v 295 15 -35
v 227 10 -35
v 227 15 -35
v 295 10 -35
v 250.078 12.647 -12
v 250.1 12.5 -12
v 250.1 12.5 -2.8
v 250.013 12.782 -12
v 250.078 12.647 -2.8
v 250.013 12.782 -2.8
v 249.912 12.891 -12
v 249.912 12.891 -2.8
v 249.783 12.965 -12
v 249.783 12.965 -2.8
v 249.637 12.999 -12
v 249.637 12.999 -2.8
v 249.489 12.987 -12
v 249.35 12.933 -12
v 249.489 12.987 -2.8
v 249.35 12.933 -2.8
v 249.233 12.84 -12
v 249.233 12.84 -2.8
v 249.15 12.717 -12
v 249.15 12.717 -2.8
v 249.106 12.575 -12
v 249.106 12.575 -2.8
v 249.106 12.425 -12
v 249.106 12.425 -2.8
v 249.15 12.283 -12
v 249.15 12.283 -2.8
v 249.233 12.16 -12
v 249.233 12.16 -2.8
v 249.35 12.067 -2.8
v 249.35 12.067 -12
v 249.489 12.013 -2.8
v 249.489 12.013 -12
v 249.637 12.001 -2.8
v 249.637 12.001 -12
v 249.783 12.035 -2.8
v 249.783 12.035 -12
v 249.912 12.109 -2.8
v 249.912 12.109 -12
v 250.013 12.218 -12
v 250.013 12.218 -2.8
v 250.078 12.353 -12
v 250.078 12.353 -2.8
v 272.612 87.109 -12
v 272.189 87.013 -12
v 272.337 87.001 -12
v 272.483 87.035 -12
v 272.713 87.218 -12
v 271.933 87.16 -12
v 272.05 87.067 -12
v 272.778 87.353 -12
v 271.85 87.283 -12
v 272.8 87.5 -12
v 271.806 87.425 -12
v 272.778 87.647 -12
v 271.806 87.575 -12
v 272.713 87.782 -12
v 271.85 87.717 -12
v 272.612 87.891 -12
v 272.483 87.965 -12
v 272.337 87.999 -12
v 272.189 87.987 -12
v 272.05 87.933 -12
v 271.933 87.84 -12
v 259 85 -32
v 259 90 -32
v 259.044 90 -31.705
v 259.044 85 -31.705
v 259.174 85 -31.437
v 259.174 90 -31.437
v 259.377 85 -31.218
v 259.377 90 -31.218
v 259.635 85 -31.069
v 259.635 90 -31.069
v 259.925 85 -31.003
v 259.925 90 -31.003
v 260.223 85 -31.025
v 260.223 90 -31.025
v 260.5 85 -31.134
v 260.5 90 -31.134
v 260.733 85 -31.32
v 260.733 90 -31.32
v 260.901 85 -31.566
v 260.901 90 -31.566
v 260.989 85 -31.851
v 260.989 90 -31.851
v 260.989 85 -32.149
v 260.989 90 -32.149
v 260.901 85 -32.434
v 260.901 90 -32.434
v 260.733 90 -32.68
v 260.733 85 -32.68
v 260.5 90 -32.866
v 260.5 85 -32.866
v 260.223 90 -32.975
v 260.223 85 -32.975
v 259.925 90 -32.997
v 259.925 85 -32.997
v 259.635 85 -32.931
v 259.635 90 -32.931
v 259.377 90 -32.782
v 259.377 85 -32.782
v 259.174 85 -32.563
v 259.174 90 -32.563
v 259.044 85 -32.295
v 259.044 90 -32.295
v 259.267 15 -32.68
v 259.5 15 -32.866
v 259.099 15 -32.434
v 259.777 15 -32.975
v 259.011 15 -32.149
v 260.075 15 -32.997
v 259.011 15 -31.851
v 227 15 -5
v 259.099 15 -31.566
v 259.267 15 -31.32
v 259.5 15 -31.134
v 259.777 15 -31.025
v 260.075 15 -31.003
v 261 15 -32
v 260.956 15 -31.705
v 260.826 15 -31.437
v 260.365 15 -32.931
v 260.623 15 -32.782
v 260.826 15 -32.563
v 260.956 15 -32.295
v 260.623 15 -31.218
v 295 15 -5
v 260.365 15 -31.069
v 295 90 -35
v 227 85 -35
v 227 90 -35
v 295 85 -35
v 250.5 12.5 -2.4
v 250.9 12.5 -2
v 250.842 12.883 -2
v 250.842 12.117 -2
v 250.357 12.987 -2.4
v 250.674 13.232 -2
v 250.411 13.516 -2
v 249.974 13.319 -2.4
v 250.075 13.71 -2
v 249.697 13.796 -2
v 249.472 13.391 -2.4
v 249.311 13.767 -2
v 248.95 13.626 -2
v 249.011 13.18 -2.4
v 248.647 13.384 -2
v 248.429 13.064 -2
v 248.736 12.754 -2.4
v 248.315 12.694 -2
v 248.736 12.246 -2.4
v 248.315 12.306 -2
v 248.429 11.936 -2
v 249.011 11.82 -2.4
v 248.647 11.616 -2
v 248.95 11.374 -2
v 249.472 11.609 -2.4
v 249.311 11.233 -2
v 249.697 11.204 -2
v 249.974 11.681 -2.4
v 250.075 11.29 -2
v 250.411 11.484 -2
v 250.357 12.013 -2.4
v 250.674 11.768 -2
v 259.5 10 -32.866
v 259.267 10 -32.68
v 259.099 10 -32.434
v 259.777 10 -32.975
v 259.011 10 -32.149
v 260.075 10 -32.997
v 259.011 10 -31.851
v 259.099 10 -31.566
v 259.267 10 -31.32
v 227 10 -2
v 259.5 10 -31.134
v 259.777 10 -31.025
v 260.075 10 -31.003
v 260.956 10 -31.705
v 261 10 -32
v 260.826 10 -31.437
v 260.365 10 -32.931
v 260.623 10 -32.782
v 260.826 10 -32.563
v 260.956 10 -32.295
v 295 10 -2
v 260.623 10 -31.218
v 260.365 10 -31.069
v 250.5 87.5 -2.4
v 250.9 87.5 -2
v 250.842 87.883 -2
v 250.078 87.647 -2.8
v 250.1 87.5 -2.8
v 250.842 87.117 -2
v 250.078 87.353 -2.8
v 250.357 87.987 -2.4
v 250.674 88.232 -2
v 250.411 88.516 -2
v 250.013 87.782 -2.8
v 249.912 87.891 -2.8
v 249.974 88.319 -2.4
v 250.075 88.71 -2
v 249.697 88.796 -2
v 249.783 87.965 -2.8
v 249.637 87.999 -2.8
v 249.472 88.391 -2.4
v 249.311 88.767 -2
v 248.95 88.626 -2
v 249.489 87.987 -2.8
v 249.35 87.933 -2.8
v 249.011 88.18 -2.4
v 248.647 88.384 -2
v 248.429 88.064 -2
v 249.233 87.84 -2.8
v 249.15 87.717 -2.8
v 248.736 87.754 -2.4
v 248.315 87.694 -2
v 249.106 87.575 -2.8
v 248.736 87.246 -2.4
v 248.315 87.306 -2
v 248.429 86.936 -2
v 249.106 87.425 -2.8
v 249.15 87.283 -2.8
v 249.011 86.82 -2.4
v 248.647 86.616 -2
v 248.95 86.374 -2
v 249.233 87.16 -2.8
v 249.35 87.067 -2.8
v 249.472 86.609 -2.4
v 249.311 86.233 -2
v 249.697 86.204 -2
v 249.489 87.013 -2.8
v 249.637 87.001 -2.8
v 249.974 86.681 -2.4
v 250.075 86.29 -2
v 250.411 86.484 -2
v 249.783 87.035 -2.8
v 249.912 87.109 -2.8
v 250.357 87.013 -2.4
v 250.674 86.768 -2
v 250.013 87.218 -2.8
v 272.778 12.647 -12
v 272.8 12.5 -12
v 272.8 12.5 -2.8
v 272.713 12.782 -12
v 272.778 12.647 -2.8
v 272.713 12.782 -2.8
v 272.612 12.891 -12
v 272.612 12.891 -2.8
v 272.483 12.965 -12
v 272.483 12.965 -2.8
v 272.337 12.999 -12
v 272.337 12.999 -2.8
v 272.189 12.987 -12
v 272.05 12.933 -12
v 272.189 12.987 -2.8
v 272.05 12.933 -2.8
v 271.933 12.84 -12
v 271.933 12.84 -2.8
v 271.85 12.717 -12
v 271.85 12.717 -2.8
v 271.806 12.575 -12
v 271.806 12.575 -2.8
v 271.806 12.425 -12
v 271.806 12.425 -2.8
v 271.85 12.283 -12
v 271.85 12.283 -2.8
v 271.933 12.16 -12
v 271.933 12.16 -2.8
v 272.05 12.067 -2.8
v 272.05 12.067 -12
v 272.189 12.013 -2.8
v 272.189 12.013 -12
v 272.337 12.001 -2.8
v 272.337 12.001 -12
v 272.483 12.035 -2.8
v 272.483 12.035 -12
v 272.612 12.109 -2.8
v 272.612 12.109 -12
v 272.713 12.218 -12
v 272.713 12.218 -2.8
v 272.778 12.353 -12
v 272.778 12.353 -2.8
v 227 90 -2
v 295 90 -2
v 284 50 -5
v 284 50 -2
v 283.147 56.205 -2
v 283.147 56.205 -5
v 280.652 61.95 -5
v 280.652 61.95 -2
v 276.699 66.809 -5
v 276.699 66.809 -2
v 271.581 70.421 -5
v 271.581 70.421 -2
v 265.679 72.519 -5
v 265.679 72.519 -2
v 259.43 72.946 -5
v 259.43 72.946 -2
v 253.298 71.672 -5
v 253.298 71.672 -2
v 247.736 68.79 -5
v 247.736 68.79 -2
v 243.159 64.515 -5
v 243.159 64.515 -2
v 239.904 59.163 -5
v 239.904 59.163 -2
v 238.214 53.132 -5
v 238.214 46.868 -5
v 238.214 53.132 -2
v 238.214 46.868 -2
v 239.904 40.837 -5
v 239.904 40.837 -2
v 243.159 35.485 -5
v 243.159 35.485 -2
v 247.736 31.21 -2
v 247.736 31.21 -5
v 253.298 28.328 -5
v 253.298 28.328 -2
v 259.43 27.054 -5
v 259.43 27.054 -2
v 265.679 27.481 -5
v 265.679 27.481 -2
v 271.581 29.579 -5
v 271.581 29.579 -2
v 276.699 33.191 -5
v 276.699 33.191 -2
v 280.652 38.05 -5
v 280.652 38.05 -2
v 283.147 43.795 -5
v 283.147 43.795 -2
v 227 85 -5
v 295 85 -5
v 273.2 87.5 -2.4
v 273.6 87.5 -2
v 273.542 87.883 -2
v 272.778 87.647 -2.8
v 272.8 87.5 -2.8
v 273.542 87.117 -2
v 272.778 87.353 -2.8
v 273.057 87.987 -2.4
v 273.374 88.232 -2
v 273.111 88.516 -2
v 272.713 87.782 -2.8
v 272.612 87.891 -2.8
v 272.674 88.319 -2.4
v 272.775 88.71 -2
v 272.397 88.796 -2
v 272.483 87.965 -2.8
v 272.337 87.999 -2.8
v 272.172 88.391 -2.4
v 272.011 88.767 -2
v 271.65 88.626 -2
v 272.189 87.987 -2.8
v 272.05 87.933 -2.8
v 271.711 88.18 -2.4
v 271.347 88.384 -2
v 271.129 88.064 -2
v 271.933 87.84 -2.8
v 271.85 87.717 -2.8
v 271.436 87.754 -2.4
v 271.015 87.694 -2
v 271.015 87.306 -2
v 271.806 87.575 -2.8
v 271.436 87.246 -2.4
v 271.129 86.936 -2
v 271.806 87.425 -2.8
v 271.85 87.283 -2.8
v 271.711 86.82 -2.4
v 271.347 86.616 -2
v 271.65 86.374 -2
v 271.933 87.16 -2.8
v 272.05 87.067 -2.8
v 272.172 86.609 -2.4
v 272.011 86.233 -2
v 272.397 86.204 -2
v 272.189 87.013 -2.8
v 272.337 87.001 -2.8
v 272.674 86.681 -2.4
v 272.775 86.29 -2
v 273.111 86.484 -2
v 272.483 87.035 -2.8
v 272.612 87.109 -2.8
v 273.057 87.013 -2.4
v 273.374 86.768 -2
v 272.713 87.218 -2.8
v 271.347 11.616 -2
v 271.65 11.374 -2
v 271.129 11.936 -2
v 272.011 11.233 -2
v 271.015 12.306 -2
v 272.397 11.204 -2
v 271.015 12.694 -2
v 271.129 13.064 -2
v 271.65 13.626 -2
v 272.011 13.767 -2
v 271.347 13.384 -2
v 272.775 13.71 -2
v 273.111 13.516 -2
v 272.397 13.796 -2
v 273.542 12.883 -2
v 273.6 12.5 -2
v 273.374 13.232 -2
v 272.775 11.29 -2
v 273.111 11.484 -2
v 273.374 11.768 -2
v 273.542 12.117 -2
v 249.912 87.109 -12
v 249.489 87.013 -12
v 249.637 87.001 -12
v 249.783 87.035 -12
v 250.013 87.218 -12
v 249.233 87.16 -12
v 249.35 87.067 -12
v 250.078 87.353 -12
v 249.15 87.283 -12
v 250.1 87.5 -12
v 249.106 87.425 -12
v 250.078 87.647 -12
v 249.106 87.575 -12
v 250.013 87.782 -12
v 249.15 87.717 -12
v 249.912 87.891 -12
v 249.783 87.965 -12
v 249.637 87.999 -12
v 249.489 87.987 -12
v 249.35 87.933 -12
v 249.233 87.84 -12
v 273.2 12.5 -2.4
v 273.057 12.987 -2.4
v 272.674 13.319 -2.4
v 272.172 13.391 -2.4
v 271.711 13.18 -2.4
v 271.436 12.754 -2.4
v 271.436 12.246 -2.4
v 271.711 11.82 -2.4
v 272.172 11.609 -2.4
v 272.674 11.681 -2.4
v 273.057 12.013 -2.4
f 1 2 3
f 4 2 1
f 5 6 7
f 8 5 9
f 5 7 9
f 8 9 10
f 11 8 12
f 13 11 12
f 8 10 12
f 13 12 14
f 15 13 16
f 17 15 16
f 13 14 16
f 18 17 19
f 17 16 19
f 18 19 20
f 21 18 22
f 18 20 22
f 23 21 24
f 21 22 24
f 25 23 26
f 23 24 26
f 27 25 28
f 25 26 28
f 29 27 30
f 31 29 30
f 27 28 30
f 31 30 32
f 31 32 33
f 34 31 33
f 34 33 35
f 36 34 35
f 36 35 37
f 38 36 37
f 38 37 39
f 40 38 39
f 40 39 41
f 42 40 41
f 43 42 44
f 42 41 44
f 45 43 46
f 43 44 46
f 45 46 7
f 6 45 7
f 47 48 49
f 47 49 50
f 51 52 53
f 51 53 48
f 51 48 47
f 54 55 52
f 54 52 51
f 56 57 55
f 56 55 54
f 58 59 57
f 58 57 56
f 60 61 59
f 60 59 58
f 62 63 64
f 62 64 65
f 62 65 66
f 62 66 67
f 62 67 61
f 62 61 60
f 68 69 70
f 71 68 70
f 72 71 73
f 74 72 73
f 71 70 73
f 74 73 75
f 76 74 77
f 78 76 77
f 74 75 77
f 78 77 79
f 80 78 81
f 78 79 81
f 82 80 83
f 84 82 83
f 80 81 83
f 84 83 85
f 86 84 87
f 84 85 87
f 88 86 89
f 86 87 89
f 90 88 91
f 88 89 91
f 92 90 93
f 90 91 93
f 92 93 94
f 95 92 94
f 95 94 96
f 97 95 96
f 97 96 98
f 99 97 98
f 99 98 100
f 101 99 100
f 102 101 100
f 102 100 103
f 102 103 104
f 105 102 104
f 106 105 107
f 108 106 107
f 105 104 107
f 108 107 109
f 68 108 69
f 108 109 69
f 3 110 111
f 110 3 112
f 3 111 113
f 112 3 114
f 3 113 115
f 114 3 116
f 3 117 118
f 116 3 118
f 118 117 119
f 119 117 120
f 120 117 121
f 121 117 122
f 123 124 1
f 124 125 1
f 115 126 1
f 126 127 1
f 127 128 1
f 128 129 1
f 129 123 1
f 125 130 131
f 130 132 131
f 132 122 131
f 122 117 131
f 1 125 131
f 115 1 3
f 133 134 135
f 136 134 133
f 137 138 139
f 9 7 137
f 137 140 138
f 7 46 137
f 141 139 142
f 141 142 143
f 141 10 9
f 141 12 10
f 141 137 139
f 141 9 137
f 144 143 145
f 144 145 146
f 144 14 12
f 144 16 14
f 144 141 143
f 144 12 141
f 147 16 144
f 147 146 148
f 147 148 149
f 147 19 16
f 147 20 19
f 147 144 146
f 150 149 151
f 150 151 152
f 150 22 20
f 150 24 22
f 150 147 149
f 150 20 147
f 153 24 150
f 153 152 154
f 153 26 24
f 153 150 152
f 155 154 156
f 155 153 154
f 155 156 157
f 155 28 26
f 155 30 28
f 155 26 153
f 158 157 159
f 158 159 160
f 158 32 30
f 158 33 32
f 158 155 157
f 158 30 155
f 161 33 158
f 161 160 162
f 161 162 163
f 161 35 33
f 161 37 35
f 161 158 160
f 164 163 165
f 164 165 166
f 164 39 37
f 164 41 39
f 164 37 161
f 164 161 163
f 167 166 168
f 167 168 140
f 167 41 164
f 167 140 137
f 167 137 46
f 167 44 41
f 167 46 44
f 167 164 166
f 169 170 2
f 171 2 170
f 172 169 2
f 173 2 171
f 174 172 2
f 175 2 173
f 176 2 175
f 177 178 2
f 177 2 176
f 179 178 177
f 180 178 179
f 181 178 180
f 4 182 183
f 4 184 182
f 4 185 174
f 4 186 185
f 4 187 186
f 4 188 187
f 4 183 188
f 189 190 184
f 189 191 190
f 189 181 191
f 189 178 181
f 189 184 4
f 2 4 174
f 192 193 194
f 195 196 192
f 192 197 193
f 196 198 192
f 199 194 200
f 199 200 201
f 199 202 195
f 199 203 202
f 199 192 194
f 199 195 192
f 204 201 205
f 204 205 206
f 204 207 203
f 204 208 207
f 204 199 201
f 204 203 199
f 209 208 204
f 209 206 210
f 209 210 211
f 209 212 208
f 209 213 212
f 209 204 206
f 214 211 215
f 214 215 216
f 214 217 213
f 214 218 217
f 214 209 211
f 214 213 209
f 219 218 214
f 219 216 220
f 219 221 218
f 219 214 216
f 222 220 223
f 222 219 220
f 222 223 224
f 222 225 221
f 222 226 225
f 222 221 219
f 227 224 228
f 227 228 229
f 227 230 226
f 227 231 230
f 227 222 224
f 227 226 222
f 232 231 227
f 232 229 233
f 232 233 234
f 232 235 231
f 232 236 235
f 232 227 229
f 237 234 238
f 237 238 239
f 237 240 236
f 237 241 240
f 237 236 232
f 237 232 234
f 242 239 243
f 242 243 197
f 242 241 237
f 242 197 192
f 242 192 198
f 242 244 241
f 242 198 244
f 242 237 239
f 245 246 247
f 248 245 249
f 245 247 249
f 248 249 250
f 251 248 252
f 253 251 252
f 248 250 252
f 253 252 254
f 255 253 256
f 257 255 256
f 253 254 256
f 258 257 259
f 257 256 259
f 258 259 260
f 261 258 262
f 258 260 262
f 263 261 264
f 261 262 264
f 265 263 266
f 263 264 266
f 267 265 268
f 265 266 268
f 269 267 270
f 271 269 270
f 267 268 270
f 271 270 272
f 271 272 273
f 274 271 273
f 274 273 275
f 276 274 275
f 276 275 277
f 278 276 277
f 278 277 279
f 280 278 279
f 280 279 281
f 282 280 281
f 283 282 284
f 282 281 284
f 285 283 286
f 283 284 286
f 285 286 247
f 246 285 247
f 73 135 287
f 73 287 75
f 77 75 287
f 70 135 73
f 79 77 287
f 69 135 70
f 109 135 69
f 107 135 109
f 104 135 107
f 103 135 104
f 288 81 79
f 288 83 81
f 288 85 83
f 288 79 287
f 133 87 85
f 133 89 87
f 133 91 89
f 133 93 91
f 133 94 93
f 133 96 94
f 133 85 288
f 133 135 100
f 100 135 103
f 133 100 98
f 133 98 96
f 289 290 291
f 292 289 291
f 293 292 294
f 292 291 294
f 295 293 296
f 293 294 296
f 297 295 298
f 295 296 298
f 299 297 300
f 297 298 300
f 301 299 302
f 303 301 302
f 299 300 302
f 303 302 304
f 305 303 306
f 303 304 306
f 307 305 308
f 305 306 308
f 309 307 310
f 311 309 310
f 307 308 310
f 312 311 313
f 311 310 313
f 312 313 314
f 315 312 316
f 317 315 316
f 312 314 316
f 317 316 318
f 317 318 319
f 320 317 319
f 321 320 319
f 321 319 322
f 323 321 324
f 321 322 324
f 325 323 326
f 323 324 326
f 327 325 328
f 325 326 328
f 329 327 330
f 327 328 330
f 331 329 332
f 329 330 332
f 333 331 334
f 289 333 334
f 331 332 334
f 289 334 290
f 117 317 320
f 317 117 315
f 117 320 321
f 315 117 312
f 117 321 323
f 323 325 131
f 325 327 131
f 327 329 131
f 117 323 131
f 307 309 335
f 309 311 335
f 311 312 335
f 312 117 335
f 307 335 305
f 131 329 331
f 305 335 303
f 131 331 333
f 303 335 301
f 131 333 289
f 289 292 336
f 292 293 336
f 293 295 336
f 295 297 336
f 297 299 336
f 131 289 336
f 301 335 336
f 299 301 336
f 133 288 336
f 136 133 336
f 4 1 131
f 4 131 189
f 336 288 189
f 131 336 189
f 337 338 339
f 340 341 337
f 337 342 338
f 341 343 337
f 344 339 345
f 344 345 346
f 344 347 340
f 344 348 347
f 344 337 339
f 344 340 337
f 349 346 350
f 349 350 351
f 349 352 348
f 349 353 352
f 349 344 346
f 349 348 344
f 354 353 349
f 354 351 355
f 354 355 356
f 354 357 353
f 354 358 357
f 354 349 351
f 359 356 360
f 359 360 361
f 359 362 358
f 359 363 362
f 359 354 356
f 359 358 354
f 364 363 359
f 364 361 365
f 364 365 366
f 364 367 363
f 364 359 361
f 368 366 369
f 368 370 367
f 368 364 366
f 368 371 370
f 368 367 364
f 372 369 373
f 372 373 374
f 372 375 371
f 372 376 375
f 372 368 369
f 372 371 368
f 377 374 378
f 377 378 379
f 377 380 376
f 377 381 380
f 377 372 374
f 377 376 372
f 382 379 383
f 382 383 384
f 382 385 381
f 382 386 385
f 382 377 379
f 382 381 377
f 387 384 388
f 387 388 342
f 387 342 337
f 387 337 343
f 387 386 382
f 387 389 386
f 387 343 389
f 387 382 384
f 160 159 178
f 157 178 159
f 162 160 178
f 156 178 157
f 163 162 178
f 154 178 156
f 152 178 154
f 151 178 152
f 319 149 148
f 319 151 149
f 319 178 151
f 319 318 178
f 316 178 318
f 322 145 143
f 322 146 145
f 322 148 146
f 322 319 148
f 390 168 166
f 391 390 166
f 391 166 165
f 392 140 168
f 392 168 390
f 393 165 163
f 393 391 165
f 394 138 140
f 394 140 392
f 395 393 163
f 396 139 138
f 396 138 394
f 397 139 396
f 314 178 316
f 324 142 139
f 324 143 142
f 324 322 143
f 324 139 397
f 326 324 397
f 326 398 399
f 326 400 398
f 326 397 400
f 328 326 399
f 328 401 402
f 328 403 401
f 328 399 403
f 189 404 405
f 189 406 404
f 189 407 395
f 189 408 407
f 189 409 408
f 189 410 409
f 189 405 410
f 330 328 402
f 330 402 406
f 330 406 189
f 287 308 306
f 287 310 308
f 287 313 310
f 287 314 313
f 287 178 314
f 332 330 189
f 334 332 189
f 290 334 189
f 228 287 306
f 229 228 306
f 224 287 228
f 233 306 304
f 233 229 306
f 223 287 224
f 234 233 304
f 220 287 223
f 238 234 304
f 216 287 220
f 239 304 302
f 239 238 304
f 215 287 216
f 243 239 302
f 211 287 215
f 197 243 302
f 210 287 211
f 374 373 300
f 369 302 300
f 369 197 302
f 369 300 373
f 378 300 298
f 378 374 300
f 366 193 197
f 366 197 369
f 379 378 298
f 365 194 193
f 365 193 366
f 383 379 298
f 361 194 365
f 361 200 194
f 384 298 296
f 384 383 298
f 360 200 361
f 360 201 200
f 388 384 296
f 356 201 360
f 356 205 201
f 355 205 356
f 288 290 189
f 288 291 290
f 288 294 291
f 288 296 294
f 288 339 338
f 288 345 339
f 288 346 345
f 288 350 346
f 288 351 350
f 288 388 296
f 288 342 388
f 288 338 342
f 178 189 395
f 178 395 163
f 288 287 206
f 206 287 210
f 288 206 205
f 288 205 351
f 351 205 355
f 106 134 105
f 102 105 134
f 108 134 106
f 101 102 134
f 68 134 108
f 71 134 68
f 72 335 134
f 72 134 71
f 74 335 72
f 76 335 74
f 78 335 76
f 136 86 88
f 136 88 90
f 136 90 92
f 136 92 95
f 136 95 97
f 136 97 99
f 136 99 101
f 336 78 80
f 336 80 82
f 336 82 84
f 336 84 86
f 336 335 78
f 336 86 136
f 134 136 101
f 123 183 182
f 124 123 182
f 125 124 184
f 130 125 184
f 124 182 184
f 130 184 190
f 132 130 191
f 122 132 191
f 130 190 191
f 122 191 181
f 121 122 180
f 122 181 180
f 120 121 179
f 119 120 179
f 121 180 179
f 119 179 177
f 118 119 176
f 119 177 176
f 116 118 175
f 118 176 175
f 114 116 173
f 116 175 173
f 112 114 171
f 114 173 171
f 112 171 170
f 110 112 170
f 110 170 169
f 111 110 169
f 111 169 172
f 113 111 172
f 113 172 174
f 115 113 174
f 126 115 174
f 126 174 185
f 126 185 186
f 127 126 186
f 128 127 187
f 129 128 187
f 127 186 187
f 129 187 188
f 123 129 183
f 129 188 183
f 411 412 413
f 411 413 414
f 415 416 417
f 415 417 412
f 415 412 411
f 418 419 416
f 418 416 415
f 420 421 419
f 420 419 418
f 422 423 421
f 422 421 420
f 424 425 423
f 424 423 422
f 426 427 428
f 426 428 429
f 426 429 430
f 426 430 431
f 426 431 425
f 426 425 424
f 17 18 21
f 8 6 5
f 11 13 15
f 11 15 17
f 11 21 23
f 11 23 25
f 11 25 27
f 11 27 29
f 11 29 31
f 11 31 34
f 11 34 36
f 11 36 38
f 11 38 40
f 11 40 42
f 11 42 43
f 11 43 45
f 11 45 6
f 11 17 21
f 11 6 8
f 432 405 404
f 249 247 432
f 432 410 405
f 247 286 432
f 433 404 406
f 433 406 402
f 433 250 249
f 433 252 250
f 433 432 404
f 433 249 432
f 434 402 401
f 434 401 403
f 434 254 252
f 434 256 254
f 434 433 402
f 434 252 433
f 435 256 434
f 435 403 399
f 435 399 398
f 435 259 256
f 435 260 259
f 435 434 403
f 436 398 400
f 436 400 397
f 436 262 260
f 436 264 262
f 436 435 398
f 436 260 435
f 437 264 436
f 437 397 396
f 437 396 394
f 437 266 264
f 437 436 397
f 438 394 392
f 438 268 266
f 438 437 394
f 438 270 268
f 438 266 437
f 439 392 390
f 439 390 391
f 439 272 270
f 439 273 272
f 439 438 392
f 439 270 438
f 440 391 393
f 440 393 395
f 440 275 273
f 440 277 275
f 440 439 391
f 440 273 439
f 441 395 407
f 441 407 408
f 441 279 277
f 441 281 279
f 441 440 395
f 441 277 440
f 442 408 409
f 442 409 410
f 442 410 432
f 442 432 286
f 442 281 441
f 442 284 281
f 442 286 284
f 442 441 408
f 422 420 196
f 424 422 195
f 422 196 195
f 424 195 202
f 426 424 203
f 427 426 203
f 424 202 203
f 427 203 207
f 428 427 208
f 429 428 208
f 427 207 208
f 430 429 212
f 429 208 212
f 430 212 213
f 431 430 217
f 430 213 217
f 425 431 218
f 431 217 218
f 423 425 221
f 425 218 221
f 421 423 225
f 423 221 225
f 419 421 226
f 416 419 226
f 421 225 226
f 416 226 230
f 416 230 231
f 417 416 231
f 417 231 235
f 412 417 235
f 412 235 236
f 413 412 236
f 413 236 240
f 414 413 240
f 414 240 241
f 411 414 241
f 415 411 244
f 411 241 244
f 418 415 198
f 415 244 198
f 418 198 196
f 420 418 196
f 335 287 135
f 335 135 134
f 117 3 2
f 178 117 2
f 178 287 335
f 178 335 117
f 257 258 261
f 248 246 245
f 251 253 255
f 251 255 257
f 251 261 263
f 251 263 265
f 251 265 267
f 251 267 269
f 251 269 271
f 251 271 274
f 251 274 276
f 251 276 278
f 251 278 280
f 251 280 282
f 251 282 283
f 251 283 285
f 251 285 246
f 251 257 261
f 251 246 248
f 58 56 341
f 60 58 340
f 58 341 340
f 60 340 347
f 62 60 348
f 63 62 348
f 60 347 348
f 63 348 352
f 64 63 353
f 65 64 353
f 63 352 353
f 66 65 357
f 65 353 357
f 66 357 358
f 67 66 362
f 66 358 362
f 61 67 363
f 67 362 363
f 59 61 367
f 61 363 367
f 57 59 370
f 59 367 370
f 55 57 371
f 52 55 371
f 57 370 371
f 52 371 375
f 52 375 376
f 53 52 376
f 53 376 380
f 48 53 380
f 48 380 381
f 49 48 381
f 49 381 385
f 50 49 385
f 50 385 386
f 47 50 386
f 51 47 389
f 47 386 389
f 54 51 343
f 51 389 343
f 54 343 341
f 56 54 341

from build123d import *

# Parameters (mm, degrees)
SKETCH009_W     = 68
SKETCH009_H     = 80
PAD005_DEPTH    = 3
SKETCH010_R     = 23
POCKET004_DEPTH = 3
SKETCH011_W     = 68
SKETCH011_H     = 5
PAD006_DEPTH    = 30
SKETCH024_R     = 1
POCKET017_DEPTH = 5
SKETCH025_R     = 1
POCKET018_DEPTH = 5
SKETCH026_R     = 0.5
POCKET019_DEPTH = 10
CHAMFER002_SIZE = 0.8


with BuildPart() as part:
    # Sketch009 → Pad005 (new body)
    with BuildSketch(Plane.XY):
        with Locations((34, 40)):
            Rectangle(SKETCH009_W, SKETCH009_H)
    extrude(amount=PAD005_DEPTH)

    # Sketch010 (on Face6 of Pad005) → Pocket004 (cut)
    with BuildSketch(Plane.XY.offset(3)):
        with Locations((34, 40)):
            Circle(SKETCH010_R)
    extrude(amount=-POCKET004_DEPTH, mode=Mode.SUBTRACT)

    # Sketch011 (on Face4 of Pocket004) → Pad006 (join)
    with BuildSketch(Plane(origin=(0, 0, 0), x_dir=(1, 0, 0), z_dir=(0, 0, -1))):
        with Locations((34, -2.5)):
            Rectangle(SKETCH011_W, SKETCH011_H)
        with Locations((34, -77.5)):
            Rectangle(SKETCH011_W, SKETCH011_H)
    extrude(amount=PAD006_DEPTH)

    # Sketch024 (on Face4 of Pad006) → Pocket017 (cut)
    with BuildSketch(Plane.XZ):
        with Locations((33, -27)):
            Circle(SKETCH024_R)
    extrude(amount=-POCKET017_DEPTH, mode=Mode.SUBTRACT)

    # Sketch025 (on Face15 of Pocket017) → Pocket018 (cut)
    with BuildSketch(Plane(origin=(0, 80, 0), x_dir=(-1, 0, 0), z_dir=(0, 1, 0))):
        with Locations((-33, -27)):
            Circle(SKETCH025_R)
    extrude(amount=-POCKET018_DEPTH, mode=Mode.SUBTRACT)

    # Sketch026 (on Face5 of Pocket018) → Pocket019 (cut)
    with BuildSketch(Plane.XY.offset(3)):
        with Locations((22.6, 2.5)):
            Circle(SKETCH026_R)
        with Locations((45.3, 2.5)):
            Circle(SKETCH026_R)
        with Locations((22.6, 77.5)):
            Circle(SKETCH026_R)
        with Locations((45.3, 77.5)):
            Circle(SKETCH026_R)
    extrude(amount=-POCKET019_DEPTH, mode=Mode.SUBTRACT)

    # Chamfer002
    chamfer002_edges = [part.edges().sort_by_distance(p)[0] for p in [
        (22.1, 2.5, 3),
        (44.8, 2.5, 3),
        (44.8, 77.5, 3),
        (22.1, 77.5, 3),
    ]]
    chamfer(chamfer002_edges, length=CHAMFER002_SIZE)


with BuildPart() as part_1:
    # Body004 placement: moved
    add(part.part.moved(Location((7, 10, -5))))


with BuildPart() as part_2:
    # Clone001 placement: moved
    add(part_1.part.moved(Location((3, 0, 0))))


with BuildPart() as part_3:
    # Body005 placement: moved
    add(part_2.part.moved(Location((217, 0, 0))))


solid = part_3.part
